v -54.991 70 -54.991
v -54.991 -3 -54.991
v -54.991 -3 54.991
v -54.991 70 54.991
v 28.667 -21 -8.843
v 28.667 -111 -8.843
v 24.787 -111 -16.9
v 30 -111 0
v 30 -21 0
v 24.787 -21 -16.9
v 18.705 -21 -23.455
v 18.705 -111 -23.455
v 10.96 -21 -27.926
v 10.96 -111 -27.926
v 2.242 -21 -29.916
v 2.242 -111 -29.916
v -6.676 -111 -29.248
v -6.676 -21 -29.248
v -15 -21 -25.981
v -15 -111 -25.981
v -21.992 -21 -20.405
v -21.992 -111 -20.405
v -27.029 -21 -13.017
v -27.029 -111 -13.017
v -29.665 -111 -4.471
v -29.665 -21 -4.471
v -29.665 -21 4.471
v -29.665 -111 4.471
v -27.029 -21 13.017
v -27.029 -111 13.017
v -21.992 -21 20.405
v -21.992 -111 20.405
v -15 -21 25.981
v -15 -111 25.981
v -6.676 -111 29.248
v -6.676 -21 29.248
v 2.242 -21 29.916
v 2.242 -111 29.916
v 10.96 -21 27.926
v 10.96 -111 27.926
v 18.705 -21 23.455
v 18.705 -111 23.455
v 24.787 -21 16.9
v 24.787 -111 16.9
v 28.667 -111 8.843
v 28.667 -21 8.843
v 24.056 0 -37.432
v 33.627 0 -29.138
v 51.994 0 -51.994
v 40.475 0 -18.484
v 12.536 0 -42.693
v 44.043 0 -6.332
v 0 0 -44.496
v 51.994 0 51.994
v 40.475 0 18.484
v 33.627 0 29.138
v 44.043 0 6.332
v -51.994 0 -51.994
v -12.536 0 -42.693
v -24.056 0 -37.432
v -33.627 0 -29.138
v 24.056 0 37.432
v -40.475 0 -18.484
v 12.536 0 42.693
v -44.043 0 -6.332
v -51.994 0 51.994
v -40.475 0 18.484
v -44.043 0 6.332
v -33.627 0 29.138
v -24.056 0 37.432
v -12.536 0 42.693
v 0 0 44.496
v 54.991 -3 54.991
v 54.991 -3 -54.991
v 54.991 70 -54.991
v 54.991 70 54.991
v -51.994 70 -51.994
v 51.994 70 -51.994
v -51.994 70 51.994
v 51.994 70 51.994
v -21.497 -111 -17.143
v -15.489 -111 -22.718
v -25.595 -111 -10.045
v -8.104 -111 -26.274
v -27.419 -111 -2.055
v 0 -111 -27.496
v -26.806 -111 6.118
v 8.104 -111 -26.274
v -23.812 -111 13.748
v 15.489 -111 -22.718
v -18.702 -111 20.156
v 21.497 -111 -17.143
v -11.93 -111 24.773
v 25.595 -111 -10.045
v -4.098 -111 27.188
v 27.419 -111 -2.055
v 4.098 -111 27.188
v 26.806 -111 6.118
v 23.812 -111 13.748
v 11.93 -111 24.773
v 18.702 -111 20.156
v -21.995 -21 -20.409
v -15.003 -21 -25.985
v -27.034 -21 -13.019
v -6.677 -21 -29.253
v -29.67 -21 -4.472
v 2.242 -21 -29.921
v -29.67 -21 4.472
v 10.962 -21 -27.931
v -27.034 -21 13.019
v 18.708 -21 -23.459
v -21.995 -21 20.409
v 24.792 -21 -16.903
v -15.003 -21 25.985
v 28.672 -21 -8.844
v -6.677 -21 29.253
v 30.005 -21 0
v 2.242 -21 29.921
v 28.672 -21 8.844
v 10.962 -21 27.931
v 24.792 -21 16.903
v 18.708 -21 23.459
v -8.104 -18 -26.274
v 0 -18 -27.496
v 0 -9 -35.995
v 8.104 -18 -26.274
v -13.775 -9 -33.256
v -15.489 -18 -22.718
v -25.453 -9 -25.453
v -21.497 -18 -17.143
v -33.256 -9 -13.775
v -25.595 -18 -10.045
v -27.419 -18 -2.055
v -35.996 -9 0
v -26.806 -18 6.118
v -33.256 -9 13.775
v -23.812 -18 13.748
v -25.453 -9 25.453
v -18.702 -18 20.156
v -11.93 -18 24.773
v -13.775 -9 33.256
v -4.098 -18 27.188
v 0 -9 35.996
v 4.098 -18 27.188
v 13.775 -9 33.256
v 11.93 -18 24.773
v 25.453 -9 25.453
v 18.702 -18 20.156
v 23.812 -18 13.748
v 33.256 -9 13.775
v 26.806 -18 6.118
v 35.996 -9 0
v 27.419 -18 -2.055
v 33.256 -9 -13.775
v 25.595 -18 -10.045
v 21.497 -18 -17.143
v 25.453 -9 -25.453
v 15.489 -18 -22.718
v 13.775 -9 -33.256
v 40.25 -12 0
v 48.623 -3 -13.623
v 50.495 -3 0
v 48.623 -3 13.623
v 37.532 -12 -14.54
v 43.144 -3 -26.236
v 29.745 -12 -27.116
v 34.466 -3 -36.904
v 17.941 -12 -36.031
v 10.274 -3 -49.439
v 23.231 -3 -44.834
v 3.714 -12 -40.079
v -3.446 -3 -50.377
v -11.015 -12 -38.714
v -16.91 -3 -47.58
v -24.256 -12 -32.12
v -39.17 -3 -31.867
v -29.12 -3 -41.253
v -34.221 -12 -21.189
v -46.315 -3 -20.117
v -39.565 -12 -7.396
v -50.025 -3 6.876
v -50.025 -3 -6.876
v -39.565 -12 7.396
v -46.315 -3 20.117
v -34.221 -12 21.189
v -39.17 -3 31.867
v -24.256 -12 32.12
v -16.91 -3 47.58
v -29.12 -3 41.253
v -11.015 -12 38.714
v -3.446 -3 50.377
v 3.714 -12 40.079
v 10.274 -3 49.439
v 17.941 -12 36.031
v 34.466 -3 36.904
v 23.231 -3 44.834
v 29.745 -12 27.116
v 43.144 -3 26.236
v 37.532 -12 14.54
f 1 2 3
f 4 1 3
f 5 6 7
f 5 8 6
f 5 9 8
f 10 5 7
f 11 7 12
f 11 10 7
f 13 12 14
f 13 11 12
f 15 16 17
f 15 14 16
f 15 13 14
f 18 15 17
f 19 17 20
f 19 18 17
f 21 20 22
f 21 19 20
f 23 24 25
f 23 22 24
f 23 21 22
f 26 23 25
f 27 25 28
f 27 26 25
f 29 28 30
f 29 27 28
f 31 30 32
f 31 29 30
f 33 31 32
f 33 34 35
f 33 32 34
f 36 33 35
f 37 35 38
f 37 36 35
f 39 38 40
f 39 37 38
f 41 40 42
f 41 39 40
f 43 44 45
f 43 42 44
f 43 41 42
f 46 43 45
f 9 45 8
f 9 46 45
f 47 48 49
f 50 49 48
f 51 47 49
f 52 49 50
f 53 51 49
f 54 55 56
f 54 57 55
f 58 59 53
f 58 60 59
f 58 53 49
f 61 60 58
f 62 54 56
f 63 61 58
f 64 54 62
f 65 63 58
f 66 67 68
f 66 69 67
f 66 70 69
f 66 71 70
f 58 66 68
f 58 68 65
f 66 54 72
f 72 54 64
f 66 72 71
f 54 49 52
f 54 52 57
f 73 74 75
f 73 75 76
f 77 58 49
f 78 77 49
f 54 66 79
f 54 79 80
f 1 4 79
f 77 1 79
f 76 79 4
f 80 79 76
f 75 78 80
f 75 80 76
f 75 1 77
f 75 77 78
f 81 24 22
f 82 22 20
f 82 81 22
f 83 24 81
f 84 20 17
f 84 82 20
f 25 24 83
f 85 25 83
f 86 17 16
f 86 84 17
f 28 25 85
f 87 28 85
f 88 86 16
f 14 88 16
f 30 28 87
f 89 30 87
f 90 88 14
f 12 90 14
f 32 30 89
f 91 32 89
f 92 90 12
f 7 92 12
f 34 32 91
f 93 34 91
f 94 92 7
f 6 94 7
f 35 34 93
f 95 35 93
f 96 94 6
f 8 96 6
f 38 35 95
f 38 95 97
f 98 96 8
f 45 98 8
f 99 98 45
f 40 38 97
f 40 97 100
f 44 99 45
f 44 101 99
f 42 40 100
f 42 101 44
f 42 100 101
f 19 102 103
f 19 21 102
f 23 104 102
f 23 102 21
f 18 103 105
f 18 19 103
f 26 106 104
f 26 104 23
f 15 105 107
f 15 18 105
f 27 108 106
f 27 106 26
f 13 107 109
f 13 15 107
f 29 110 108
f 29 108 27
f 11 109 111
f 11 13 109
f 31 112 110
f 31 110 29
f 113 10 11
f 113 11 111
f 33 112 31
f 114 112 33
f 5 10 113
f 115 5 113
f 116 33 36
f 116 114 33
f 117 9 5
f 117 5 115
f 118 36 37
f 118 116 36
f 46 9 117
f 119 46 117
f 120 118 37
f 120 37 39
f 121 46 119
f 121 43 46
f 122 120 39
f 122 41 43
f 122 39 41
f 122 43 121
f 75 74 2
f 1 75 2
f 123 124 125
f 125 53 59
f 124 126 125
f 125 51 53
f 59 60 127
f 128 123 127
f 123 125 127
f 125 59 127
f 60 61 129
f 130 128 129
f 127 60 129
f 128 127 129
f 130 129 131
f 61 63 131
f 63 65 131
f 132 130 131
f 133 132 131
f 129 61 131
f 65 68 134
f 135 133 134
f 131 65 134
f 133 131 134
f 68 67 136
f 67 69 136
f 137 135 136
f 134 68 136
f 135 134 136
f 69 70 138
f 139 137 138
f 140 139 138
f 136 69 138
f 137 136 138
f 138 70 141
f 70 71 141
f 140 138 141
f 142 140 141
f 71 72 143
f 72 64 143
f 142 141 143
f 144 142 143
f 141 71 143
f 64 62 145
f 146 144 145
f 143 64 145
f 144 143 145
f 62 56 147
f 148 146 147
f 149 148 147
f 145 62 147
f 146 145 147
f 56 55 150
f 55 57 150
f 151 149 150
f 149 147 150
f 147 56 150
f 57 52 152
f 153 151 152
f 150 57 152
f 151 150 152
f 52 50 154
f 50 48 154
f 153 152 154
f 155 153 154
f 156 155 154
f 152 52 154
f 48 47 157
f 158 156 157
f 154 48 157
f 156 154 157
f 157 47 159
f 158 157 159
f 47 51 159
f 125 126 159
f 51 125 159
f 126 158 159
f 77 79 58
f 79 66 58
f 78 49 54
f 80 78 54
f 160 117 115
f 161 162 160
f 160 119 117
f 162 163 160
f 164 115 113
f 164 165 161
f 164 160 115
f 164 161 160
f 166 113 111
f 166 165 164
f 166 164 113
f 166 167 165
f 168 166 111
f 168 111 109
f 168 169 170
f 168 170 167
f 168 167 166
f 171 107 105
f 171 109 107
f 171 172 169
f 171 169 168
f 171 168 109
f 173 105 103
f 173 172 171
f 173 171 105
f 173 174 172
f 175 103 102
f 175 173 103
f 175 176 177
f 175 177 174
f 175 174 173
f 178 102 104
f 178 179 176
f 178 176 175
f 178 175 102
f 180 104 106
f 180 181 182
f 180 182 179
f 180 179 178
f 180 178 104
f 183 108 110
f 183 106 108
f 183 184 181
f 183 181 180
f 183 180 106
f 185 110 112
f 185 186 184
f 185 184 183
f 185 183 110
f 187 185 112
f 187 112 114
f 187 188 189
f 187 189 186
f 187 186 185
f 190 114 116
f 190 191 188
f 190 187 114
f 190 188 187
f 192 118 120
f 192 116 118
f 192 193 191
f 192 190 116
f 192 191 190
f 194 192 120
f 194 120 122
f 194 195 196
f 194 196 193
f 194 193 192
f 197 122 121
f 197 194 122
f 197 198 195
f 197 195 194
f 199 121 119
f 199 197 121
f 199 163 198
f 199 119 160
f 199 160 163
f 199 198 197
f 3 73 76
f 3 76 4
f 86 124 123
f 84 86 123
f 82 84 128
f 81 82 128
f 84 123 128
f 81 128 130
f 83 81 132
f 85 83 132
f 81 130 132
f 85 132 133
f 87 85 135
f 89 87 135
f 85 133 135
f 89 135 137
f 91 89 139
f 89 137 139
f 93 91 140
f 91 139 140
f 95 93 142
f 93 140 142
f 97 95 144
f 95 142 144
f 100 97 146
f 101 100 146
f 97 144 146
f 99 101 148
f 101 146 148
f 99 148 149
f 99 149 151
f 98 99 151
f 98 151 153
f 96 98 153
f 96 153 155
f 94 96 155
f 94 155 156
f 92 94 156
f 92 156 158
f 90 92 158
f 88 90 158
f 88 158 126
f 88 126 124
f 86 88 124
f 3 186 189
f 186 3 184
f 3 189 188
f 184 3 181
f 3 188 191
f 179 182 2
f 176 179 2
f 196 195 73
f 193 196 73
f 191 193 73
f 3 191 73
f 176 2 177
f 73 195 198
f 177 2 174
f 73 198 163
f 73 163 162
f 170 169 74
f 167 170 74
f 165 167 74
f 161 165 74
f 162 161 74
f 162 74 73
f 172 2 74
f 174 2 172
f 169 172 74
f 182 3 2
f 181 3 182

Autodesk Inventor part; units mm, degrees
ref_plane "YZ Plane" through (0, 0, 0) normal (1, 0, 0) x (0, 1, 0)
ref_plane "XZ Plane" through (0, 0, 0) normal (0, 1, 0) x (-1, 0, 0)
ref_plane "XY Plane" through (0, 0, 0) normal (0, 0, 1) x (1, 0, 0)
sketch "Sketch1" plane through (0, 0, 0) normal (0, 1, 0) x (-1, 0, 0)
  line L0 (-51.9938, 0) -> (-51.9938, 51.9938)
  line L1 (-51.9938, 51.9938) -> (0, 51.9938)
  line L2 (51.9938, 0) -> (51.9938, -51.9938)
  line L3 (51.9938, -51.9938) -> (0, -51.9938)
  line L4 (-51.9938, 0) -> (-51.9938, 51.9938)
  line L5 (-51.9938, 51.9938) -> (0, 51.9938)
  line L6 (-51.9938, 0) -> (-51.9938, -51.9938)
  line L7 (-51.9938, -51.9938) -> (0, -51.9938)
  line L8 (51.9938, 0) -> (51.9938, 51.9938)
  line L9 (51.9938, 51.9938) -> (0, 51.9938)
  point P0 (0, 0)
  dimension "d0" = 51.9938
  dimension "d1" = 51.9938
  dimension "d2" = 51.9938
  dimension "d3" = 51.9938
  dimension "d4" = 51.9938
  dimension "d5" = 51.9938
  dimension "d6" = 51.9938
  dimension "d7" = 51.9938
  dimension "d8" = 51.9938
  dimension "d9" = 51.9938
extrude "Extrusion1" add sketch "Sketch1" against normal blind 3
sketch "Sketch2" plane through (0, 0, 0) normal (0, 1, 0) x (1, 0, 0)
  line L0 (54.991, 0) -> (54.991, -54.991)
  line L1 (54.991, -54.991) -> (0, -54.991)
  line L2 (-54.991, 0) -> (-54.991, -54.991)
  line L3 (-54.991, -54.991) -> (0, -54.991)
  line L4 (-54.991, 0) -> (-54.991, 54.991)
  line L5 (-54.991, 54.991) -> (0, 54.991)
  line L6 (54.991, 0) -> (54.991, 54.991)
  line L7 (54.991, 54.991) -> (0, 54.991)
  line L8 (-51.9938, 51.9938) -> (51.9938, 51.9938) projected
  line L9 (51.9938, 0) -> (51.9938, 51.9938)
  line L10 (51.9938, 51.9938) -> (0, 51.9938)
  line L11 (51.9938, 0) -> (51.9938, -51.9938)
  line L12 (51.9938, -51.9938) -> (0, -51.9938)
  line L13 (-51.9938, 0) -> (-51.9938, -51.9938)
  line L14 (-51.9938, -51.9938) -> (0, -51.9938)
  line L15 (-51.9938, 0) -> (-51.9938, 51.9938)
  line L16 (-51.9938, 51.9938) -> (0, 51.9938)
  point P0 (0, 0)
  dimension "d14" = 54.991
  dimension "d15" = 54.991
  dimension "d16" = 54.991
  dimension "d17" = 54.991
  dimension "d18" = 54.991
  dimension "d19" = 54.991
  dimension "d20" = 51.9938
  dimension "d21" = 51.9938
  dimension "d22" = 51.9938
  dimension "d23" = 51.9938
  dimension "d24" = 51.9938
  dimension "d25" = 51.9938
  dimension "d26" = 51.9938
  dimension "d27" = 51.9938
extrude "Extrusion2" add sketch "Sketch2" along normal blind 70 and the other way blind 3
sketch "Sketch3" plane through (0, -3, 0) normal (0, -1, 0) x (1, 0, 0)
  circle A0 centre (0, 0) radius 50.4952
  dimension "d32" = 100.9904
extrude "Extrusion3" add sketch "Sketch3" along normal blind 18
sketch "Sketch4" plane through (0, -21, 0) normal (0, -1, 0) x (1, 0, 0)
  circle A0 centre (0, 0) radius 30
  dimension "d35" = 60
extrude "Extrusion4" add sketch "Sketch4" along normal blind 90
sketch "Sketch6" plane through (0, -111, 0) normal (0, -1, 0) x (1, 0, 0)
  circle A0 centre (0, 0) radius 27.4955
  dimension "d39" = 54.991
hole "Hole1" at (0, -111, 0) direction (0, 1, 0) diameter 54.991 depth 111
chamfer "Chamfer1" distance 20.49 distance2 18 1 edges at (-50.4952, -21, 0) measured on face at (-21.4731, -21, -37.7754)
chamfer "Chamfer2" distance 17 distance2 18 1 edges at (0, 0, 27.4955) measured on face at (-43.7609, 0, -1.1047)
properties part number "PMT housing"
